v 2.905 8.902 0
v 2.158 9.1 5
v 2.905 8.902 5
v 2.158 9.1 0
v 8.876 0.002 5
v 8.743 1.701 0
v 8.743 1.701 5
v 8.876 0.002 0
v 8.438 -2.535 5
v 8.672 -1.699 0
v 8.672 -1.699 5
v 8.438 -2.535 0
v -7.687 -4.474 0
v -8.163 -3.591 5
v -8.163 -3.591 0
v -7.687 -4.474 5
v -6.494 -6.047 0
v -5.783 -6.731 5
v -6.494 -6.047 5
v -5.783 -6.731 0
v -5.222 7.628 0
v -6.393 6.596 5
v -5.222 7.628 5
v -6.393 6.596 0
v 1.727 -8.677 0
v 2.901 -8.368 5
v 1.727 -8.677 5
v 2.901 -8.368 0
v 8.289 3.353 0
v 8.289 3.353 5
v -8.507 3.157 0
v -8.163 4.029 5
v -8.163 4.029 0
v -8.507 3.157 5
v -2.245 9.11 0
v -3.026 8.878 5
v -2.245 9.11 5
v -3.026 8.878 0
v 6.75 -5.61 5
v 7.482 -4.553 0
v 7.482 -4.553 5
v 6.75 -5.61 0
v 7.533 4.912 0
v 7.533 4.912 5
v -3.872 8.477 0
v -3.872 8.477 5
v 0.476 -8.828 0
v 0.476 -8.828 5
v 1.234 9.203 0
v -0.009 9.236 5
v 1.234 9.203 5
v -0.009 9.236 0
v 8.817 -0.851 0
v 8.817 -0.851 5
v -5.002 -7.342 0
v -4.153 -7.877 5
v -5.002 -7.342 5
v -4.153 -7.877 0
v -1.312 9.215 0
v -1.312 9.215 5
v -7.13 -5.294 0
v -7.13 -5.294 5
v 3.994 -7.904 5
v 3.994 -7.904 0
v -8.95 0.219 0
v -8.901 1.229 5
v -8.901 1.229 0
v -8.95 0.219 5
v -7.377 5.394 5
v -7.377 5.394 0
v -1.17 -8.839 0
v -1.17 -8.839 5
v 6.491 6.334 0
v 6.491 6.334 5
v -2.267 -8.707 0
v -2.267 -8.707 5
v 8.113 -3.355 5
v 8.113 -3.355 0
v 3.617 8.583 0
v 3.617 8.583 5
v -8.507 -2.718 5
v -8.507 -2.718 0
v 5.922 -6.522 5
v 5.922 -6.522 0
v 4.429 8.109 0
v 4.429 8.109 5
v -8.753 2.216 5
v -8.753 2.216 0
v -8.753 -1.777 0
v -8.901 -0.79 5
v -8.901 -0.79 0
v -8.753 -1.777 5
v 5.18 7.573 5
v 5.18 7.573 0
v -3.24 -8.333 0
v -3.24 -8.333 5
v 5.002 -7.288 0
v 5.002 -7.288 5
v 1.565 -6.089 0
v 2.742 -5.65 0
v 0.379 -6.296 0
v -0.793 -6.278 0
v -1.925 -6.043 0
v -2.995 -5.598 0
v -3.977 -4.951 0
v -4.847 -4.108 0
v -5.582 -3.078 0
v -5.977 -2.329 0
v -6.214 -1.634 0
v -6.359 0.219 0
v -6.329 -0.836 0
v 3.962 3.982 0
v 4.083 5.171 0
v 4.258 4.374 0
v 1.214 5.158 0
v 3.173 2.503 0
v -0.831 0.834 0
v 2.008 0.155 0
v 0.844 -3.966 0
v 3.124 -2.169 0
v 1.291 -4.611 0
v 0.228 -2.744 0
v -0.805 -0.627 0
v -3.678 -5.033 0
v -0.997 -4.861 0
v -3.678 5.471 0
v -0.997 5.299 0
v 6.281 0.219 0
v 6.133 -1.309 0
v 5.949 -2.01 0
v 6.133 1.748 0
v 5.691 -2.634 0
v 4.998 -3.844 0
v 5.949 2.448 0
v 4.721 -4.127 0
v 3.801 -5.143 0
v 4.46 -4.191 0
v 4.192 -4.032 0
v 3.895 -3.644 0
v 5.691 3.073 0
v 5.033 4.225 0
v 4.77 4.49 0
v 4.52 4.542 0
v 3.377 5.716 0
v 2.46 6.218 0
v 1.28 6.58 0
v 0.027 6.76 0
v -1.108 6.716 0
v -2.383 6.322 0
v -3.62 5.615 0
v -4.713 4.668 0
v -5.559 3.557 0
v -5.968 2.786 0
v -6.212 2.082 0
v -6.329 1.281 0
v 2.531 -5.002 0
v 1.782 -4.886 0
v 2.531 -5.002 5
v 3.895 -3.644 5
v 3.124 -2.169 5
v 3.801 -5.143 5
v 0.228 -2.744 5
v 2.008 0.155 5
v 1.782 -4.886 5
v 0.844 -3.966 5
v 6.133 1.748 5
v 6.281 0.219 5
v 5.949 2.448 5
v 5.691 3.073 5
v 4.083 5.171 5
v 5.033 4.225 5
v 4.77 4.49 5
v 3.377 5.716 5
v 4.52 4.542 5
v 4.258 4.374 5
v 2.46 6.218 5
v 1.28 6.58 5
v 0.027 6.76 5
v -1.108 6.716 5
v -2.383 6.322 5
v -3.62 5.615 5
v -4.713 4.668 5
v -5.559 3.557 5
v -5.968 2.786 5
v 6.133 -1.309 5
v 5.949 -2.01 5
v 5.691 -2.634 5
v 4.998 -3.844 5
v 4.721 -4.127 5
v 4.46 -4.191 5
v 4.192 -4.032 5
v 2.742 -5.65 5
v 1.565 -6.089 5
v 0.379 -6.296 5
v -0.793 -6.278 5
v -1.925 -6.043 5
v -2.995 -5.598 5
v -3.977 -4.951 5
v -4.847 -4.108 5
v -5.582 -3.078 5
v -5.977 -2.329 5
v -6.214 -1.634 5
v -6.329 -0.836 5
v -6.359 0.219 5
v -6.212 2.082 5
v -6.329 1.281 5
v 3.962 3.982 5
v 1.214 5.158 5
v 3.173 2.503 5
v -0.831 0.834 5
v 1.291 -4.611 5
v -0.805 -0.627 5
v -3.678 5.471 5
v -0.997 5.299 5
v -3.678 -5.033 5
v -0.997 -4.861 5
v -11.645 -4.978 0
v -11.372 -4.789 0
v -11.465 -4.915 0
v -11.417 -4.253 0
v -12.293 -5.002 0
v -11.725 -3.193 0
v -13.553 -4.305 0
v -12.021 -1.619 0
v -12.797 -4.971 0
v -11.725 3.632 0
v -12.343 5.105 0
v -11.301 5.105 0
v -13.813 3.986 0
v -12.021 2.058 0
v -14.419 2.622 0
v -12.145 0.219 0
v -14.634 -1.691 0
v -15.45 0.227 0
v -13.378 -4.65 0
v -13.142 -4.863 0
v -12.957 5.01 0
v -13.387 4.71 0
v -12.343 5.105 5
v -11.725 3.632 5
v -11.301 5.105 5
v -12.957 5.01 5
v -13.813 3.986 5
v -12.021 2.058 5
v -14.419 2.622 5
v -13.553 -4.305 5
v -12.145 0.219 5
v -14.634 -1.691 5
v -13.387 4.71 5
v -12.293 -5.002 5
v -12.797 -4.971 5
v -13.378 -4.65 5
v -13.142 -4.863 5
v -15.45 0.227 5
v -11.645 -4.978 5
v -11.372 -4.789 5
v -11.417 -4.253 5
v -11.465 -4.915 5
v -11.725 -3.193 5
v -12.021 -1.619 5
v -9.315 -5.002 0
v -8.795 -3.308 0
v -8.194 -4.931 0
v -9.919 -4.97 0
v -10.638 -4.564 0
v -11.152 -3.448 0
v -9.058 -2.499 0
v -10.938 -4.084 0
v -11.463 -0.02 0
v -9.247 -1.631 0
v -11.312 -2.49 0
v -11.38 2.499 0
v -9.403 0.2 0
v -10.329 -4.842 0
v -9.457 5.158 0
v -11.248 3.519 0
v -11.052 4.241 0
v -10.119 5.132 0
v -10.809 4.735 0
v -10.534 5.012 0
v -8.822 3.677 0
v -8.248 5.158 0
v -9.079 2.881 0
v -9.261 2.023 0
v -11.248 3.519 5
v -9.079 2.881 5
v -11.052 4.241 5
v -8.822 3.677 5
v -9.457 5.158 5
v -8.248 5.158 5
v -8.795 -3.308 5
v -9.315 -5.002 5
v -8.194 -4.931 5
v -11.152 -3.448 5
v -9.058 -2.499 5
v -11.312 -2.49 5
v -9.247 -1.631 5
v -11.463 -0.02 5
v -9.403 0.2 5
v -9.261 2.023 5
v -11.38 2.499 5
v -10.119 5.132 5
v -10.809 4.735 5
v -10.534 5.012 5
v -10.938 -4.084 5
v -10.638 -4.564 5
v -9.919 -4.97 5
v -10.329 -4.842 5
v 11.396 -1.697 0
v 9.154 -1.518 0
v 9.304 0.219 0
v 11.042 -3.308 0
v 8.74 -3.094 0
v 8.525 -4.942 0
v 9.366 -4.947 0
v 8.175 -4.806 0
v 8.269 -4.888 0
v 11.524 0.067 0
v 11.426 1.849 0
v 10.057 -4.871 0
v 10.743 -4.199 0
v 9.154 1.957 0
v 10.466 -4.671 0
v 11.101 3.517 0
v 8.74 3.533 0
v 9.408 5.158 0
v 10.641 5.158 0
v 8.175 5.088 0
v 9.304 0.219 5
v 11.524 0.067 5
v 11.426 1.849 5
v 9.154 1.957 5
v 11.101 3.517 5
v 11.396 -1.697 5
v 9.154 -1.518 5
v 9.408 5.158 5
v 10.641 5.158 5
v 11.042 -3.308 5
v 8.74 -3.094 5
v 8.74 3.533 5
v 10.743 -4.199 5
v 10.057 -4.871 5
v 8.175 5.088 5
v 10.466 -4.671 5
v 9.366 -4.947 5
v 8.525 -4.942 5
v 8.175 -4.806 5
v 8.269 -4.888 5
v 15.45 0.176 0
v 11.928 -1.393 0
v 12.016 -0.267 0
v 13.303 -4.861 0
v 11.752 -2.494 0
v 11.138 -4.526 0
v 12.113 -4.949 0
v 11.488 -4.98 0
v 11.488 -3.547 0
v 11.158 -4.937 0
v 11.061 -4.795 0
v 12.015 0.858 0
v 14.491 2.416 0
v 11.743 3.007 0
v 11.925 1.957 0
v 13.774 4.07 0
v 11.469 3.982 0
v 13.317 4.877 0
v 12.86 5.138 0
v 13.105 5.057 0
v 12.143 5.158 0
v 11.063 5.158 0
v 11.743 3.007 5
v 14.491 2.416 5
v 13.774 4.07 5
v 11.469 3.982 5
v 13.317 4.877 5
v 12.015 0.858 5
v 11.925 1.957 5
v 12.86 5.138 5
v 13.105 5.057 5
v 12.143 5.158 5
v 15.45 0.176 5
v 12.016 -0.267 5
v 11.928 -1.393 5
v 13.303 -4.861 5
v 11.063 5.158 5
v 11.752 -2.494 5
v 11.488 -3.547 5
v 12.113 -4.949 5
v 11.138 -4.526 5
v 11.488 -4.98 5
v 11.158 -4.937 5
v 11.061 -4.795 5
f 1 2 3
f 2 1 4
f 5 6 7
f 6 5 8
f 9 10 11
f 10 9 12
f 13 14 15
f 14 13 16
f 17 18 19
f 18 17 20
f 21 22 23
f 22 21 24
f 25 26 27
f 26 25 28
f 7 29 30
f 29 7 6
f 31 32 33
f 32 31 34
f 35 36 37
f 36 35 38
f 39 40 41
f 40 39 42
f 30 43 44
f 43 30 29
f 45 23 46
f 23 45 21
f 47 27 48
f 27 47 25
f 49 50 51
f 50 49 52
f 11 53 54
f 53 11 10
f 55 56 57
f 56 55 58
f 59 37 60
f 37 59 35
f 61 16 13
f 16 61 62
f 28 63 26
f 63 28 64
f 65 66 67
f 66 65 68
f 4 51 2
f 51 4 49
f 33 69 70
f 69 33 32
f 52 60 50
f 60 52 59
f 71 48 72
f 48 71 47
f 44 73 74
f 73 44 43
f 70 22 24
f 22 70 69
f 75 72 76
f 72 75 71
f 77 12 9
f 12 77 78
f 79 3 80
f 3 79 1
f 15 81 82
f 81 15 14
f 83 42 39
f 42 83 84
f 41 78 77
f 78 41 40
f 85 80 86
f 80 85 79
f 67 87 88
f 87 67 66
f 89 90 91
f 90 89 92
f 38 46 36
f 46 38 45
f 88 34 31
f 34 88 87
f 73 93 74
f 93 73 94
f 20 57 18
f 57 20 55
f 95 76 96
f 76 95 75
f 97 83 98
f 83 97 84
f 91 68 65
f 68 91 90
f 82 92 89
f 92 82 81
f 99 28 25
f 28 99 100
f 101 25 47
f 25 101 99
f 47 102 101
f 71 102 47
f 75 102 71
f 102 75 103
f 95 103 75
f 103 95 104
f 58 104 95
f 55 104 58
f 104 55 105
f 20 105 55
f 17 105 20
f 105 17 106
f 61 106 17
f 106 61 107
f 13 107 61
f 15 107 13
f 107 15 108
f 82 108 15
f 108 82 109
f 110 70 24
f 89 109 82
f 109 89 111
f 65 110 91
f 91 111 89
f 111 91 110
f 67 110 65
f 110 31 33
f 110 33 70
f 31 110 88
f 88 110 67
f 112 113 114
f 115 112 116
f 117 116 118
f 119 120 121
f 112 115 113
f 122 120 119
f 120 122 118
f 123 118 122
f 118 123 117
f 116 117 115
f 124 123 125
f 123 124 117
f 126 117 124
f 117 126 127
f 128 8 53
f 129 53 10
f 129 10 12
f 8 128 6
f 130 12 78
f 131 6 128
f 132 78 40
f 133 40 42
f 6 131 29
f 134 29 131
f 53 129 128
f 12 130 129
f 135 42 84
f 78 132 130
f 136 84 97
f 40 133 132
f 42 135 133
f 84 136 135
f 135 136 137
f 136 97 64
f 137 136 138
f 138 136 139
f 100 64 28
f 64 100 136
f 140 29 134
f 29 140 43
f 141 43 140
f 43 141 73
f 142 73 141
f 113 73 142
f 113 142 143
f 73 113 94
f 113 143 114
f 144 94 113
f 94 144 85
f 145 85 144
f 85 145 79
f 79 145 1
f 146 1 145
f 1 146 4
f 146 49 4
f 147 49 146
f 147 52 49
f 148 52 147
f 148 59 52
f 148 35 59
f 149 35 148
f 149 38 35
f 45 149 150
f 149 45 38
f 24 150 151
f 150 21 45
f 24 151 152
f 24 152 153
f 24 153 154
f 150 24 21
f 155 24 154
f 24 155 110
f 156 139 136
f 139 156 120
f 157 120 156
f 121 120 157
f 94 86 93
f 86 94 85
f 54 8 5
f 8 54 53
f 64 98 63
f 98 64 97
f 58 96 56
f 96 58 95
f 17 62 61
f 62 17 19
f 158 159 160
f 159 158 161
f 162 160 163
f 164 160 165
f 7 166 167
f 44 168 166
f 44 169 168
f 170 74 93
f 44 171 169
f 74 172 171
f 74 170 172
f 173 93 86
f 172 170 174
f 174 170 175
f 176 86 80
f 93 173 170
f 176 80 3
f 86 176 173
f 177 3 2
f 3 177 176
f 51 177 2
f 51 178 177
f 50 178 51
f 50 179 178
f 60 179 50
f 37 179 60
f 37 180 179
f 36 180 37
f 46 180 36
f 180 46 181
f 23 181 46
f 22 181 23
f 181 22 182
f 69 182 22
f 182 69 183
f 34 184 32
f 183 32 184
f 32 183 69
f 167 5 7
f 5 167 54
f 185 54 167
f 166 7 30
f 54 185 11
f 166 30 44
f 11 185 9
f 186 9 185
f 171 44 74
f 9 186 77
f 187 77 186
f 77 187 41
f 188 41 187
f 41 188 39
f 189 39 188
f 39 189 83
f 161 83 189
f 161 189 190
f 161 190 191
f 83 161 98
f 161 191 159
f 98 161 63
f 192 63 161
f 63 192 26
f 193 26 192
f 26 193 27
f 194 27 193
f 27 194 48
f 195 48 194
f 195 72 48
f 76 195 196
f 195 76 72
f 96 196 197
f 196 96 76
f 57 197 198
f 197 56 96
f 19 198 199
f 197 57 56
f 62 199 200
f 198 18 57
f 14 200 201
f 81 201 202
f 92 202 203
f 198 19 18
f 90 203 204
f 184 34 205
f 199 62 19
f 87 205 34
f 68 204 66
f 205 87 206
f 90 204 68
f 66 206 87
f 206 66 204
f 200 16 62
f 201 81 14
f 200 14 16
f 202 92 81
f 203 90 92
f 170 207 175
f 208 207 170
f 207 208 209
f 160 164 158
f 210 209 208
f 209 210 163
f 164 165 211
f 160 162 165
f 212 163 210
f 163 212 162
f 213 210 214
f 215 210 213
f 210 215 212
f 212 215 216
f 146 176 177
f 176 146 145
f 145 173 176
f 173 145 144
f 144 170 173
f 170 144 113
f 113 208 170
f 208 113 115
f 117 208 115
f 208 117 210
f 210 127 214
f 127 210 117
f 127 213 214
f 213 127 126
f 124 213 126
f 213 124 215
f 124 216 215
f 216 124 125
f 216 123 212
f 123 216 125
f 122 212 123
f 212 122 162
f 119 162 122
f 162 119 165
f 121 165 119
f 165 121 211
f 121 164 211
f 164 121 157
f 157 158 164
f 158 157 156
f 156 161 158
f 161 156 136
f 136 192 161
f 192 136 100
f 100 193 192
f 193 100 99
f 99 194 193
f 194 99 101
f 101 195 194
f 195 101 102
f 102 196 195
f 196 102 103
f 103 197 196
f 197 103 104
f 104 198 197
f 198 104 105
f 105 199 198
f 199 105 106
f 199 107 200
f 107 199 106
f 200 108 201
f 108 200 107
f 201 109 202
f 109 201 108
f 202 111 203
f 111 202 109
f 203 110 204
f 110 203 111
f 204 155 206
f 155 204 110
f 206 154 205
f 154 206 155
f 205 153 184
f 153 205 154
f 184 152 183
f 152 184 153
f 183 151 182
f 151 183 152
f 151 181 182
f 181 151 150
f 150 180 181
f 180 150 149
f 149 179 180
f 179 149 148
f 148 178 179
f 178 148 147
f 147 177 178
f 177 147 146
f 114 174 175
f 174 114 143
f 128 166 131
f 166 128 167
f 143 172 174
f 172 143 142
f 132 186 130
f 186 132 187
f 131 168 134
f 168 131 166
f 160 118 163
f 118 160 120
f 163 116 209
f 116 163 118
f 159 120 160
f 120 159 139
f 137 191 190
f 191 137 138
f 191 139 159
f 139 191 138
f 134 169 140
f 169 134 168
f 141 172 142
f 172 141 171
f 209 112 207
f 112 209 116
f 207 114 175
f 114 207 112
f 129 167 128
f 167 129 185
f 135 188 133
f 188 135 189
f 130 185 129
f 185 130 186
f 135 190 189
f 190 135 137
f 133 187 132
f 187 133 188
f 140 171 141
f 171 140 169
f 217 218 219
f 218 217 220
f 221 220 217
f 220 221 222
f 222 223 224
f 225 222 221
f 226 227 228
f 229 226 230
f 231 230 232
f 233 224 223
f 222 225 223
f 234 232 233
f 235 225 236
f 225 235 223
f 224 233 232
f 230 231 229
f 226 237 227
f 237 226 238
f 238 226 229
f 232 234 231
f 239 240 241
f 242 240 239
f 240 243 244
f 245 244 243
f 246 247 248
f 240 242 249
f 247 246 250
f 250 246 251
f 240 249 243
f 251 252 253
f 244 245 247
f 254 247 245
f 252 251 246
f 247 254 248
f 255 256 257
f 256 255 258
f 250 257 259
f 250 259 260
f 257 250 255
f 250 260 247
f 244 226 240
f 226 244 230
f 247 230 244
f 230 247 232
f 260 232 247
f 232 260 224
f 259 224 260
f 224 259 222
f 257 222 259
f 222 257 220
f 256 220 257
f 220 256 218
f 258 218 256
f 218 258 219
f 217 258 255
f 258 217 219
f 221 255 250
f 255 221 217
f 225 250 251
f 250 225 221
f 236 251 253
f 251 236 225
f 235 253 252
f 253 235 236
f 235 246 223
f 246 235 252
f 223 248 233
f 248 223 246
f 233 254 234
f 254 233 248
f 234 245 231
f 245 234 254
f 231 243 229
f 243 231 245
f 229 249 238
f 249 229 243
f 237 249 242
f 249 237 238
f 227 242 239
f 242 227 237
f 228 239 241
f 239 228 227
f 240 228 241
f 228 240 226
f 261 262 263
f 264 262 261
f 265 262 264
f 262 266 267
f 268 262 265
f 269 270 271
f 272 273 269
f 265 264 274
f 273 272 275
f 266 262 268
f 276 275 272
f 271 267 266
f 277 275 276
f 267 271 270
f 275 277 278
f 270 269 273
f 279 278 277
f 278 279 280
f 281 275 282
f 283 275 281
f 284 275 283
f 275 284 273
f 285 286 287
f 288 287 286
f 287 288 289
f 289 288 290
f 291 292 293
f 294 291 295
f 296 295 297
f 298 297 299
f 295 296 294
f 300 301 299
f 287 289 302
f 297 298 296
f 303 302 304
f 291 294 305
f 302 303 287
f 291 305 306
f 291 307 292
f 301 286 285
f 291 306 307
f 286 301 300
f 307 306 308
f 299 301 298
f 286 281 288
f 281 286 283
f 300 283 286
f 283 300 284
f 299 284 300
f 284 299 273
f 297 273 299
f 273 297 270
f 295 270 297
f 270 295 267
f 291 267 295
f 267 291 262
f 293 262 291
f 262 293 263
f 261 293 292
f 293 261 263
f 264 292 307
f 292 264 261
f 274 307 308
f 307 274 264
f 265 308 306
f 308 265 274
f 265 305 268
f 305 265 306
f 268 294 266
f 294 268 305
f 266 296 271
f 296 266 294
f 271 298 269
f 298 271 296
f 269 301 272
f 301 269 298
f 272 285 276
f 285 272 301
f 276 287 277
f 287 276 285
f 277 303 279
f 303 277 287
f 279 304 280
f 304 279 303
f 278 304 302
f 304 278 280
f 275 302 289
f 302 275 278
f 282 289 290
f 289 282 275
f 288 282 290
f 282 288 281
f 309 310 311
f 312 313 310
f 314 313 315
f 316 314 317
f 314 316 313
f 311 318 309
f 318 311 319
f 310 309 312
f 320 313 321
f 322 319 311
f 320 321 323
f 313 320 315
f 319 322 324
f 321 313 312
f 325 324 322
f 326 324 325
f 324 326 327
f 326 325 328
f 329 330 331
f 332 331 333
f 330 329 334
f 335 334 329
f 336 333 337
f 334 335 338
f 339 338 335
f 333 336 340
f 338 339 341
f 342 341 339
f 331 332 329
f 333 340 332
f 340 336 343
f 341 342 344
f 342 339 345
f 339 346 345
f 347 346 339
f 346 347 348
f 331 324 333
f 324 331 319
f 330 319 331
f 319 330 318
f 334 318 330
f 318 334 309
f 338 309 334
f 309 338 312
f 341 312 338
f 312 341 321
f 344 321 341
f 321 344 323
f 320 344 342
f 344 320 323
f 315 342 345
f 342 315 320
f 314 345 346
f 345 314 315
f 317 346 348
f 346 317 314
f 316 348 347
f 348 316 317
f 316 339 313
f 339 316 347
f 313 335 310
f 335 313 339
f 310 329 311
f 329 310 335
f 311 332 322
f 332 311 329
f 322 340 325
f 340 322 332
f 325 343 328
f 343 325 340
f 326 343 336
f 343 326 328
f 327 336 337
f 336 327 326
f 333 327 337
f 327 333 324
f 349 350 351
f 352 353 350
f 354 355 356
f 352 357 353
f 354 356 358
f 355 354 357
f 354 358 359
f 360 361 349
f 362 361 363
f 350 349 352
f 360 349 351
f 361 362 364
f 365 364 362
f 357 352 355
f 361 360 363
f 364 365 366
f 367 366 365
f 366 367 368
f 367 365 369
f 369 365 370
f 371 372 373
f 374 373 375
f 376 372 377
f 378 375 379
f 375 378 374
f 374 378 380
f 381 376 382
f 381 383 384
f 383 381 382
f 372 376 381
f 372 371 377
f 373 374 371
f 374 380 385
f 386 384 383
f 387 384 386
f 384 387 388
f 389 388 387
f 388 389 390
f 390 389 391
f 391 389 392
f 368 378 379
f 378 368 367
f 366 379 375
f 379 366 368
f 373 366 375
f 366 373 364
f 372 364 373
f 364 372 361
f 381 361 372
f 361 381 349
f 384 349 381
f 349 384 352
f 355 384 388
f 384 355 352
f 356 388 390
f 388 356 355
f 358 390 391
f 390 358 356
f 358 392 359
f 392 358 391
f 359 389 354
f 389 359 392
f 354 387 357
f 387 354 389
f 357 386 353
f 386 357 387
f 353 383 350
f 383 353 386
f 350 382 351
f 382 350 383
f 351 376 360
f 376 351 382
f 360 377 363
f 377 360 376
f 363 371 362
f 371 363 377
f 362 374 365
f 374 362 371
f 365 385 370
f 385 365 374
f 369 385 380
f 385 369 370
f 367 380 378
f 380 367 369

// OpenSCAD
// Module names are of the form poly_<inkscape-path-id>().  As a result,
// you can associate a polygon in this OpenSCAD program with the corresponding
// SVG element in the Inkscape document by looking for the XML element with
// the attribute id="inkscape-path-id".

// fudge value is used to ensure that subtracted solids are a tad taller
// in the z dimension than the polygon being subtracted from.  This helps
// keep the resulting .stl file manifold.
fudge = 0.1;

module poly_rect414771(h)
{
  scale([25.4/90, -25.4/90, 1]) union()
  {
    linear_extrude(height=h)
      polygon([[31.519730,-3.062050],[31.538930,0.974630],[22.212130,1.019130],[22.192830,-3.017550]]);
  }
}

module poly_rect41477(h)
{
  scale([25.4/90, -25.4/90, 1]) union()
  {
    linear_extrude(height=h)
      polygon([[-22.435720,-3.436360],[-22.416520,0.600320],[-31.743320,0.644820],[-31.762620,-3.391860]]);
  }
}

module poly_rect41475(h)
{
  scale([25.4/90, -25.4/90, 1]) union()
  {
    linear_extrude(height=h)
      polygon([[-2.904870,23.796880],[1.131860,23.796880],[1.131860,33.123780],[-2.904870,33.123780]]);
  }
}

module poly_path4151(h)
{
  scale([25.4/90, -25.4/90, 1]) union()
  {
    difference()
    {
       linear_extrude(height=h)
         polygon([[-1.136740,-25.899290],[-4.049573,-25.594538],[-6.902453,-24.934371],[-9.662092,-23.927071],[-12.295197,-22.580922],[-14.768481,-20.904209],[-17.048653,-18.905213],[-19.102422,-16.592219],[-20.896500,-13.973510],[-23.053309,-9.392866],[-24.254064,-4.603689],[-24.529307,0.255145],[-23.909579,5.044761],[-22.425423,9.626283],[-20.107381,13.860834],[-16.985996,17.609538],[-13.091810,20.733520],[-8.671519,22.988618],[-4.042495,24.245516],[0.658686,24.537601],[5.295448,23.898263],[9.731214,22.360890],[13.829409,19.958873],[17.453456,16.725600],[20.466780,12.694460],[22.641514,8.122969],[23.860875,3.339035],[24.154910,-1.518378],[23.553668,-6.310304],[22.087194,-10.897777],[19.785536,-15.141833],[16.678743,-18.903505],[12.796860,-22.043830],[12.722660,-22.088730],[12.628960,-22.153130],[9.331535,-23.925434],[5.899681,-25.130981],[2.391059,-25.784125],[-1.136670,-25.899220]]);
       translate([0, 0, -fudge])
         linear_extrude(height=h+2*fudge)
           polygon([[-1.039040,-23.063360],[2.060195,-22.956315],[5.145435,-22.374164],[8.167735,-21.305065],[11.078150,-19.737180],[11.140650,-19.700080],[11.144650,-19.696080],[11.226650,-19.639480],[14.659772,-16.859824],[17.410034,-13.524365],[19.449515,-9.757144],[20.750291,-5.682199],[21.284441,-1.423569],[21.024040,2.894707],[19.941168,7.148590],[18.007900,11.214040],[15.338679,14.795691],[12.144208,17.662638],[8.540945,19.787522],[4.645350,21.142983],[0.573882,21.701661],[-3.557000,21.436198],[-7.630837,20.319234],[-11.531170,18.323410],[-14.975016,15.558397],[-17.738110,12.234704],[-19.792072,8.476241],[-21.108520,4.406916],[-21.659074,0.150640],[-21.415352,-4.168680],[-20.348975,-8.427133],[-18.431560,-12.500810],[-16.840194,-14.828472],[-15.025535,-16.881945],[-13.015986,-18.654417],[-10.839949,-20.139074],[-8.525827,-21.329104],[-6.102023,-22.217695],[-3.596939,-22.798035],[-1.038980,-23.063310]]);
    }
  }
}

module poly_rect4147(h)
{
  scale([25.4/90, -25.4/90, 1]) union()
  {
    linear_extrude(height=h)
      polygon([[-2.384500,-33.123780],[1.652230,-33.123780],[1.652230,-23.796880],[-2.384500,-23.796880]]);
  }
}

module poly_path4147(h)
{
  scale([25.4/90, -25.4/90, 1]) union()
  {
    difference()
    {
       linear_extrude(height=h)
         polygon([[-8.033220,30.851730],[-11.480113,29.527278],[-14.714078,27.911346],[-17.722198,26.015144],[-20.491556,23.849881],[-23.009238,21.426767],[-25.262326,18.757011],[-27.237906,15.851822],[-28.923060,12.722410],[-30.144003,9.631542],[-31.016106,6.297133],[-31.539367,2.800362],[-31.713787,-0.777590],[-31.539367,-4.355542],[-31.016106,-7.852313],[-30.144003,-11.186722],[-28.923060,-14.277590],[-26.138597,-19.111033],[-22.653128,-23.372953],[-18.502022,-27.026686],[-13.720650,-30.035570],[-10.721320,-31.457986],[-7.953466,-32.279502],[-4.647346,-32.651352],[-0.033220,-32.724770],[4.371645,-32.607745],[7.645927,-32.243480],[10.292989,-31.541318],[12.816190,-30.410600],[15.692371,-28.733029],[18.353221,-26.832677],[22.998589,-22.444174],[26.691623,-17.406171],[29.371651,-11.879750],[30.978002,-6.025991],[31.450005,-0.005976],[31.241666,3.016040],[30.726988,6.019215],[29.898387,8.983413],[28.748280,11.888500],[26.510124,16.133441],[23.917820,19.877519],[20.984914,23.111031],[17.724950,25.824270],[14.151473,28.007531],[10.278027,29.651108],[6.118158,30.745296],[1.685410,31.280390],[-4.147124,31.319080],[-8.033220,30.851730]]);
       translate([0, 0, -fudge])
         linear_extrude(height=h+2*fudge)
           polygon([[9.716230,20.019590],[13.466780,18.222410],[8.966780,17.722410],[6.313795,17.312649],[4.573165,16.336486],[2.989495,14.053286],[0.807390,9.722410],[-2.852000,2.222410],[-3.192610,9.722410],[-3.533220,17.222410],[-8.283220,17.527200],[-13.033220,17.831990],[-13.033220,-0.777590],[-13.033220,-19.387170],[-8.283220,-19.082380],[-3.533220,-18.777590],[-3.238240,-10.865750],[-2.943260,-2.953910],[0.678420,-10.615750],[4.300100,-18.277590],[9.383440,-18.299790],[14.466780,-18.321990],[11.966780,-20.253000],[8.716987,-22.031894],[4.534956,-23.315576],[0.095565,-23.953616],[-3.926310,-23.795580],[-8.445153,-22.399298],[-12.826094,-19.893906],[-16.699463,-16.541736],[-19.695590,-12.605120],[-21.145909,-9.871962],[-22.009462,-7.376546],[-22.425487,-4.538517],[-22.533220,-0.777520],[-22.425906,2.961688],[-22.017560,5.788930],[-21.178579,8.254109],[-19.779360,10.907130],[-17.175097,14.556691],[-14.090325,17.541849],[-10.610631,19.836163],[-6.821597,21.413194],[-2.808810,22.246499],[1.342147,22.309639],[5.545688,21.576173],[9.716230,20.019660]]);
       translate([0, 0, -fudge])
         linear_extrude(height=h+2*fudge)
           polygon([[20.164870,9.334130],[21.079515,7.120513],[21.732833,4.637485],[22.255488,-0.777589],[21.732833,-6.192660],[21.079515,-8.675686],[20.164870,-10.889300],[17.833777,-14.969424],[16.902049,-15.910424],[16.014880,-16.093505],[15.088780,-15.499759],[14.040260,-14.110276],[11.242000,-8.868470],[7.115420,-0.547910],[11.068260,7.687160],[13.802213,12.912150],[14.853570,14.285001],[15.801538,14.850800],[16.726383,14.624079],[17.708376,13.619372],[20.164870,9.334130]]);
    }
    linear_extrude(height=h)
      polygon([[-48.021260,15.253860],[-51.851110,5.990840],[-54.742420,-0.803630],[-51.091160,-9.290610],[-48.944923,-14.123899],[-47.432959,-16.687808],[-45.911445,-17.752455],[-43.736560,-18.087960],[-40.044040,-18.087960],[-41.544040,-12.868660],[-42.595774,-7.291976],[-43.033220,-0.777590],[-42.595774,5.736796],[-41.544040,11.313480],[-40.455425,15.070609],[-40.295080,16.967486],[-40.625412,17.416918],[-41.262697,17.639593],[-43.557970,17.722410],[-45.342388,17.615182],[-46.567635,17.230755],[-47.403873,16.475018],[-48.021260,15.253860]]);
    linear_extrude(height=h)
      polygon([[-38.757540,14.472410],[-39.515955,12.218470],[-40.082158,8.822656],[-40.617858,0.069979],[-40.324488,-8.856483],[-39.854356,-12.469527],[-39.161900,-15.027590],[-38.299979,-16.778782],[-37.324976,-17.757816],[-35.854953,-18.184237],[-33.507970,-18.277590],[-29.225370,-18.277590],[-31.260640,-13.027590],[-32.169987,-10.207449],[-32.815557,-7.166737],[-33.316466,-0.708390],[-32.765562,5.777857],[-32.096366,8.853444],[-31.165040,11.722410],[-29.033690,17.472410],[-33.007510,17.722410],[-35.145710,17.611672],[-36.598839,17.156275],[-37.693803,16.171446],[-38.757510,14.472410]]);
    linear_extrude(height=h)
      polygon([[28.967280,17.029910],[30.967280,10.961680],[32.436616,5.378054],[32.966780,-0.777590],[32.436616,-6.933234],[30.967280,-12.516860],[28.967280,-18.027590],[33.335000,-18.277590],[37.703230,-18.277590],[39.335000,-12.461990],[40.487606,-6.552141],[40.834171,-0.236088],[40.378793,6.013114],[39.125570,11.722410],[38.067397,14.879726],[37.082747,16.550109],[35.634782,17.258517],[33.186660,17.529910],[30.206520,17.509867],[29.300063,17.319172],[28.967280,17.029910]]);
    linear_extrude(height=h)
      polygon([[39.466060,16.036330],[40.705609,12.566812],[41.639620,8.837146],[42.264696,4.934755],[42.577441,0.947065],[42.574460,-3.038499],[42.252355,-6.934511],[41.607730,-10.653546],[40.637190,-14.108180],[39.200710,-18.277590],[43.024730,-18.277590],[45.565472,-18.207090],[46.433399,-17.917694],[47.186245,-17.279961],[48.806336,-14.422762],[51.345030,-8.562050],[54.742420,-0.624540],[50.940340,8.298930],[47.138250,17.222410],[42.921000,17.536330],[40.706884,17.645908],[39.536127,17.494566],[39.194072,16.989106],[39.466060,16.036330]]);
  }
}
// poly_rect414771(5);
// poly_rect41477(5);
// poly_rect41475(5);
// poly_path4151(5);
// poly_rect4147(5);
// poly_path4147(5);


module K_Logo (){
	difference()
	{
		difference()
		{
			difference()
			{
				difference()
				{
					difference(){
						poly_path4147(5);
					*poly_rect4147(10);
						}
					*poly_path4151(10);
				}
				*poly_rect414771(10);
			}
			*poly_rect41477(10);
		}
		*poly_rect41475(10);
	}

}

	K_Logo ();
